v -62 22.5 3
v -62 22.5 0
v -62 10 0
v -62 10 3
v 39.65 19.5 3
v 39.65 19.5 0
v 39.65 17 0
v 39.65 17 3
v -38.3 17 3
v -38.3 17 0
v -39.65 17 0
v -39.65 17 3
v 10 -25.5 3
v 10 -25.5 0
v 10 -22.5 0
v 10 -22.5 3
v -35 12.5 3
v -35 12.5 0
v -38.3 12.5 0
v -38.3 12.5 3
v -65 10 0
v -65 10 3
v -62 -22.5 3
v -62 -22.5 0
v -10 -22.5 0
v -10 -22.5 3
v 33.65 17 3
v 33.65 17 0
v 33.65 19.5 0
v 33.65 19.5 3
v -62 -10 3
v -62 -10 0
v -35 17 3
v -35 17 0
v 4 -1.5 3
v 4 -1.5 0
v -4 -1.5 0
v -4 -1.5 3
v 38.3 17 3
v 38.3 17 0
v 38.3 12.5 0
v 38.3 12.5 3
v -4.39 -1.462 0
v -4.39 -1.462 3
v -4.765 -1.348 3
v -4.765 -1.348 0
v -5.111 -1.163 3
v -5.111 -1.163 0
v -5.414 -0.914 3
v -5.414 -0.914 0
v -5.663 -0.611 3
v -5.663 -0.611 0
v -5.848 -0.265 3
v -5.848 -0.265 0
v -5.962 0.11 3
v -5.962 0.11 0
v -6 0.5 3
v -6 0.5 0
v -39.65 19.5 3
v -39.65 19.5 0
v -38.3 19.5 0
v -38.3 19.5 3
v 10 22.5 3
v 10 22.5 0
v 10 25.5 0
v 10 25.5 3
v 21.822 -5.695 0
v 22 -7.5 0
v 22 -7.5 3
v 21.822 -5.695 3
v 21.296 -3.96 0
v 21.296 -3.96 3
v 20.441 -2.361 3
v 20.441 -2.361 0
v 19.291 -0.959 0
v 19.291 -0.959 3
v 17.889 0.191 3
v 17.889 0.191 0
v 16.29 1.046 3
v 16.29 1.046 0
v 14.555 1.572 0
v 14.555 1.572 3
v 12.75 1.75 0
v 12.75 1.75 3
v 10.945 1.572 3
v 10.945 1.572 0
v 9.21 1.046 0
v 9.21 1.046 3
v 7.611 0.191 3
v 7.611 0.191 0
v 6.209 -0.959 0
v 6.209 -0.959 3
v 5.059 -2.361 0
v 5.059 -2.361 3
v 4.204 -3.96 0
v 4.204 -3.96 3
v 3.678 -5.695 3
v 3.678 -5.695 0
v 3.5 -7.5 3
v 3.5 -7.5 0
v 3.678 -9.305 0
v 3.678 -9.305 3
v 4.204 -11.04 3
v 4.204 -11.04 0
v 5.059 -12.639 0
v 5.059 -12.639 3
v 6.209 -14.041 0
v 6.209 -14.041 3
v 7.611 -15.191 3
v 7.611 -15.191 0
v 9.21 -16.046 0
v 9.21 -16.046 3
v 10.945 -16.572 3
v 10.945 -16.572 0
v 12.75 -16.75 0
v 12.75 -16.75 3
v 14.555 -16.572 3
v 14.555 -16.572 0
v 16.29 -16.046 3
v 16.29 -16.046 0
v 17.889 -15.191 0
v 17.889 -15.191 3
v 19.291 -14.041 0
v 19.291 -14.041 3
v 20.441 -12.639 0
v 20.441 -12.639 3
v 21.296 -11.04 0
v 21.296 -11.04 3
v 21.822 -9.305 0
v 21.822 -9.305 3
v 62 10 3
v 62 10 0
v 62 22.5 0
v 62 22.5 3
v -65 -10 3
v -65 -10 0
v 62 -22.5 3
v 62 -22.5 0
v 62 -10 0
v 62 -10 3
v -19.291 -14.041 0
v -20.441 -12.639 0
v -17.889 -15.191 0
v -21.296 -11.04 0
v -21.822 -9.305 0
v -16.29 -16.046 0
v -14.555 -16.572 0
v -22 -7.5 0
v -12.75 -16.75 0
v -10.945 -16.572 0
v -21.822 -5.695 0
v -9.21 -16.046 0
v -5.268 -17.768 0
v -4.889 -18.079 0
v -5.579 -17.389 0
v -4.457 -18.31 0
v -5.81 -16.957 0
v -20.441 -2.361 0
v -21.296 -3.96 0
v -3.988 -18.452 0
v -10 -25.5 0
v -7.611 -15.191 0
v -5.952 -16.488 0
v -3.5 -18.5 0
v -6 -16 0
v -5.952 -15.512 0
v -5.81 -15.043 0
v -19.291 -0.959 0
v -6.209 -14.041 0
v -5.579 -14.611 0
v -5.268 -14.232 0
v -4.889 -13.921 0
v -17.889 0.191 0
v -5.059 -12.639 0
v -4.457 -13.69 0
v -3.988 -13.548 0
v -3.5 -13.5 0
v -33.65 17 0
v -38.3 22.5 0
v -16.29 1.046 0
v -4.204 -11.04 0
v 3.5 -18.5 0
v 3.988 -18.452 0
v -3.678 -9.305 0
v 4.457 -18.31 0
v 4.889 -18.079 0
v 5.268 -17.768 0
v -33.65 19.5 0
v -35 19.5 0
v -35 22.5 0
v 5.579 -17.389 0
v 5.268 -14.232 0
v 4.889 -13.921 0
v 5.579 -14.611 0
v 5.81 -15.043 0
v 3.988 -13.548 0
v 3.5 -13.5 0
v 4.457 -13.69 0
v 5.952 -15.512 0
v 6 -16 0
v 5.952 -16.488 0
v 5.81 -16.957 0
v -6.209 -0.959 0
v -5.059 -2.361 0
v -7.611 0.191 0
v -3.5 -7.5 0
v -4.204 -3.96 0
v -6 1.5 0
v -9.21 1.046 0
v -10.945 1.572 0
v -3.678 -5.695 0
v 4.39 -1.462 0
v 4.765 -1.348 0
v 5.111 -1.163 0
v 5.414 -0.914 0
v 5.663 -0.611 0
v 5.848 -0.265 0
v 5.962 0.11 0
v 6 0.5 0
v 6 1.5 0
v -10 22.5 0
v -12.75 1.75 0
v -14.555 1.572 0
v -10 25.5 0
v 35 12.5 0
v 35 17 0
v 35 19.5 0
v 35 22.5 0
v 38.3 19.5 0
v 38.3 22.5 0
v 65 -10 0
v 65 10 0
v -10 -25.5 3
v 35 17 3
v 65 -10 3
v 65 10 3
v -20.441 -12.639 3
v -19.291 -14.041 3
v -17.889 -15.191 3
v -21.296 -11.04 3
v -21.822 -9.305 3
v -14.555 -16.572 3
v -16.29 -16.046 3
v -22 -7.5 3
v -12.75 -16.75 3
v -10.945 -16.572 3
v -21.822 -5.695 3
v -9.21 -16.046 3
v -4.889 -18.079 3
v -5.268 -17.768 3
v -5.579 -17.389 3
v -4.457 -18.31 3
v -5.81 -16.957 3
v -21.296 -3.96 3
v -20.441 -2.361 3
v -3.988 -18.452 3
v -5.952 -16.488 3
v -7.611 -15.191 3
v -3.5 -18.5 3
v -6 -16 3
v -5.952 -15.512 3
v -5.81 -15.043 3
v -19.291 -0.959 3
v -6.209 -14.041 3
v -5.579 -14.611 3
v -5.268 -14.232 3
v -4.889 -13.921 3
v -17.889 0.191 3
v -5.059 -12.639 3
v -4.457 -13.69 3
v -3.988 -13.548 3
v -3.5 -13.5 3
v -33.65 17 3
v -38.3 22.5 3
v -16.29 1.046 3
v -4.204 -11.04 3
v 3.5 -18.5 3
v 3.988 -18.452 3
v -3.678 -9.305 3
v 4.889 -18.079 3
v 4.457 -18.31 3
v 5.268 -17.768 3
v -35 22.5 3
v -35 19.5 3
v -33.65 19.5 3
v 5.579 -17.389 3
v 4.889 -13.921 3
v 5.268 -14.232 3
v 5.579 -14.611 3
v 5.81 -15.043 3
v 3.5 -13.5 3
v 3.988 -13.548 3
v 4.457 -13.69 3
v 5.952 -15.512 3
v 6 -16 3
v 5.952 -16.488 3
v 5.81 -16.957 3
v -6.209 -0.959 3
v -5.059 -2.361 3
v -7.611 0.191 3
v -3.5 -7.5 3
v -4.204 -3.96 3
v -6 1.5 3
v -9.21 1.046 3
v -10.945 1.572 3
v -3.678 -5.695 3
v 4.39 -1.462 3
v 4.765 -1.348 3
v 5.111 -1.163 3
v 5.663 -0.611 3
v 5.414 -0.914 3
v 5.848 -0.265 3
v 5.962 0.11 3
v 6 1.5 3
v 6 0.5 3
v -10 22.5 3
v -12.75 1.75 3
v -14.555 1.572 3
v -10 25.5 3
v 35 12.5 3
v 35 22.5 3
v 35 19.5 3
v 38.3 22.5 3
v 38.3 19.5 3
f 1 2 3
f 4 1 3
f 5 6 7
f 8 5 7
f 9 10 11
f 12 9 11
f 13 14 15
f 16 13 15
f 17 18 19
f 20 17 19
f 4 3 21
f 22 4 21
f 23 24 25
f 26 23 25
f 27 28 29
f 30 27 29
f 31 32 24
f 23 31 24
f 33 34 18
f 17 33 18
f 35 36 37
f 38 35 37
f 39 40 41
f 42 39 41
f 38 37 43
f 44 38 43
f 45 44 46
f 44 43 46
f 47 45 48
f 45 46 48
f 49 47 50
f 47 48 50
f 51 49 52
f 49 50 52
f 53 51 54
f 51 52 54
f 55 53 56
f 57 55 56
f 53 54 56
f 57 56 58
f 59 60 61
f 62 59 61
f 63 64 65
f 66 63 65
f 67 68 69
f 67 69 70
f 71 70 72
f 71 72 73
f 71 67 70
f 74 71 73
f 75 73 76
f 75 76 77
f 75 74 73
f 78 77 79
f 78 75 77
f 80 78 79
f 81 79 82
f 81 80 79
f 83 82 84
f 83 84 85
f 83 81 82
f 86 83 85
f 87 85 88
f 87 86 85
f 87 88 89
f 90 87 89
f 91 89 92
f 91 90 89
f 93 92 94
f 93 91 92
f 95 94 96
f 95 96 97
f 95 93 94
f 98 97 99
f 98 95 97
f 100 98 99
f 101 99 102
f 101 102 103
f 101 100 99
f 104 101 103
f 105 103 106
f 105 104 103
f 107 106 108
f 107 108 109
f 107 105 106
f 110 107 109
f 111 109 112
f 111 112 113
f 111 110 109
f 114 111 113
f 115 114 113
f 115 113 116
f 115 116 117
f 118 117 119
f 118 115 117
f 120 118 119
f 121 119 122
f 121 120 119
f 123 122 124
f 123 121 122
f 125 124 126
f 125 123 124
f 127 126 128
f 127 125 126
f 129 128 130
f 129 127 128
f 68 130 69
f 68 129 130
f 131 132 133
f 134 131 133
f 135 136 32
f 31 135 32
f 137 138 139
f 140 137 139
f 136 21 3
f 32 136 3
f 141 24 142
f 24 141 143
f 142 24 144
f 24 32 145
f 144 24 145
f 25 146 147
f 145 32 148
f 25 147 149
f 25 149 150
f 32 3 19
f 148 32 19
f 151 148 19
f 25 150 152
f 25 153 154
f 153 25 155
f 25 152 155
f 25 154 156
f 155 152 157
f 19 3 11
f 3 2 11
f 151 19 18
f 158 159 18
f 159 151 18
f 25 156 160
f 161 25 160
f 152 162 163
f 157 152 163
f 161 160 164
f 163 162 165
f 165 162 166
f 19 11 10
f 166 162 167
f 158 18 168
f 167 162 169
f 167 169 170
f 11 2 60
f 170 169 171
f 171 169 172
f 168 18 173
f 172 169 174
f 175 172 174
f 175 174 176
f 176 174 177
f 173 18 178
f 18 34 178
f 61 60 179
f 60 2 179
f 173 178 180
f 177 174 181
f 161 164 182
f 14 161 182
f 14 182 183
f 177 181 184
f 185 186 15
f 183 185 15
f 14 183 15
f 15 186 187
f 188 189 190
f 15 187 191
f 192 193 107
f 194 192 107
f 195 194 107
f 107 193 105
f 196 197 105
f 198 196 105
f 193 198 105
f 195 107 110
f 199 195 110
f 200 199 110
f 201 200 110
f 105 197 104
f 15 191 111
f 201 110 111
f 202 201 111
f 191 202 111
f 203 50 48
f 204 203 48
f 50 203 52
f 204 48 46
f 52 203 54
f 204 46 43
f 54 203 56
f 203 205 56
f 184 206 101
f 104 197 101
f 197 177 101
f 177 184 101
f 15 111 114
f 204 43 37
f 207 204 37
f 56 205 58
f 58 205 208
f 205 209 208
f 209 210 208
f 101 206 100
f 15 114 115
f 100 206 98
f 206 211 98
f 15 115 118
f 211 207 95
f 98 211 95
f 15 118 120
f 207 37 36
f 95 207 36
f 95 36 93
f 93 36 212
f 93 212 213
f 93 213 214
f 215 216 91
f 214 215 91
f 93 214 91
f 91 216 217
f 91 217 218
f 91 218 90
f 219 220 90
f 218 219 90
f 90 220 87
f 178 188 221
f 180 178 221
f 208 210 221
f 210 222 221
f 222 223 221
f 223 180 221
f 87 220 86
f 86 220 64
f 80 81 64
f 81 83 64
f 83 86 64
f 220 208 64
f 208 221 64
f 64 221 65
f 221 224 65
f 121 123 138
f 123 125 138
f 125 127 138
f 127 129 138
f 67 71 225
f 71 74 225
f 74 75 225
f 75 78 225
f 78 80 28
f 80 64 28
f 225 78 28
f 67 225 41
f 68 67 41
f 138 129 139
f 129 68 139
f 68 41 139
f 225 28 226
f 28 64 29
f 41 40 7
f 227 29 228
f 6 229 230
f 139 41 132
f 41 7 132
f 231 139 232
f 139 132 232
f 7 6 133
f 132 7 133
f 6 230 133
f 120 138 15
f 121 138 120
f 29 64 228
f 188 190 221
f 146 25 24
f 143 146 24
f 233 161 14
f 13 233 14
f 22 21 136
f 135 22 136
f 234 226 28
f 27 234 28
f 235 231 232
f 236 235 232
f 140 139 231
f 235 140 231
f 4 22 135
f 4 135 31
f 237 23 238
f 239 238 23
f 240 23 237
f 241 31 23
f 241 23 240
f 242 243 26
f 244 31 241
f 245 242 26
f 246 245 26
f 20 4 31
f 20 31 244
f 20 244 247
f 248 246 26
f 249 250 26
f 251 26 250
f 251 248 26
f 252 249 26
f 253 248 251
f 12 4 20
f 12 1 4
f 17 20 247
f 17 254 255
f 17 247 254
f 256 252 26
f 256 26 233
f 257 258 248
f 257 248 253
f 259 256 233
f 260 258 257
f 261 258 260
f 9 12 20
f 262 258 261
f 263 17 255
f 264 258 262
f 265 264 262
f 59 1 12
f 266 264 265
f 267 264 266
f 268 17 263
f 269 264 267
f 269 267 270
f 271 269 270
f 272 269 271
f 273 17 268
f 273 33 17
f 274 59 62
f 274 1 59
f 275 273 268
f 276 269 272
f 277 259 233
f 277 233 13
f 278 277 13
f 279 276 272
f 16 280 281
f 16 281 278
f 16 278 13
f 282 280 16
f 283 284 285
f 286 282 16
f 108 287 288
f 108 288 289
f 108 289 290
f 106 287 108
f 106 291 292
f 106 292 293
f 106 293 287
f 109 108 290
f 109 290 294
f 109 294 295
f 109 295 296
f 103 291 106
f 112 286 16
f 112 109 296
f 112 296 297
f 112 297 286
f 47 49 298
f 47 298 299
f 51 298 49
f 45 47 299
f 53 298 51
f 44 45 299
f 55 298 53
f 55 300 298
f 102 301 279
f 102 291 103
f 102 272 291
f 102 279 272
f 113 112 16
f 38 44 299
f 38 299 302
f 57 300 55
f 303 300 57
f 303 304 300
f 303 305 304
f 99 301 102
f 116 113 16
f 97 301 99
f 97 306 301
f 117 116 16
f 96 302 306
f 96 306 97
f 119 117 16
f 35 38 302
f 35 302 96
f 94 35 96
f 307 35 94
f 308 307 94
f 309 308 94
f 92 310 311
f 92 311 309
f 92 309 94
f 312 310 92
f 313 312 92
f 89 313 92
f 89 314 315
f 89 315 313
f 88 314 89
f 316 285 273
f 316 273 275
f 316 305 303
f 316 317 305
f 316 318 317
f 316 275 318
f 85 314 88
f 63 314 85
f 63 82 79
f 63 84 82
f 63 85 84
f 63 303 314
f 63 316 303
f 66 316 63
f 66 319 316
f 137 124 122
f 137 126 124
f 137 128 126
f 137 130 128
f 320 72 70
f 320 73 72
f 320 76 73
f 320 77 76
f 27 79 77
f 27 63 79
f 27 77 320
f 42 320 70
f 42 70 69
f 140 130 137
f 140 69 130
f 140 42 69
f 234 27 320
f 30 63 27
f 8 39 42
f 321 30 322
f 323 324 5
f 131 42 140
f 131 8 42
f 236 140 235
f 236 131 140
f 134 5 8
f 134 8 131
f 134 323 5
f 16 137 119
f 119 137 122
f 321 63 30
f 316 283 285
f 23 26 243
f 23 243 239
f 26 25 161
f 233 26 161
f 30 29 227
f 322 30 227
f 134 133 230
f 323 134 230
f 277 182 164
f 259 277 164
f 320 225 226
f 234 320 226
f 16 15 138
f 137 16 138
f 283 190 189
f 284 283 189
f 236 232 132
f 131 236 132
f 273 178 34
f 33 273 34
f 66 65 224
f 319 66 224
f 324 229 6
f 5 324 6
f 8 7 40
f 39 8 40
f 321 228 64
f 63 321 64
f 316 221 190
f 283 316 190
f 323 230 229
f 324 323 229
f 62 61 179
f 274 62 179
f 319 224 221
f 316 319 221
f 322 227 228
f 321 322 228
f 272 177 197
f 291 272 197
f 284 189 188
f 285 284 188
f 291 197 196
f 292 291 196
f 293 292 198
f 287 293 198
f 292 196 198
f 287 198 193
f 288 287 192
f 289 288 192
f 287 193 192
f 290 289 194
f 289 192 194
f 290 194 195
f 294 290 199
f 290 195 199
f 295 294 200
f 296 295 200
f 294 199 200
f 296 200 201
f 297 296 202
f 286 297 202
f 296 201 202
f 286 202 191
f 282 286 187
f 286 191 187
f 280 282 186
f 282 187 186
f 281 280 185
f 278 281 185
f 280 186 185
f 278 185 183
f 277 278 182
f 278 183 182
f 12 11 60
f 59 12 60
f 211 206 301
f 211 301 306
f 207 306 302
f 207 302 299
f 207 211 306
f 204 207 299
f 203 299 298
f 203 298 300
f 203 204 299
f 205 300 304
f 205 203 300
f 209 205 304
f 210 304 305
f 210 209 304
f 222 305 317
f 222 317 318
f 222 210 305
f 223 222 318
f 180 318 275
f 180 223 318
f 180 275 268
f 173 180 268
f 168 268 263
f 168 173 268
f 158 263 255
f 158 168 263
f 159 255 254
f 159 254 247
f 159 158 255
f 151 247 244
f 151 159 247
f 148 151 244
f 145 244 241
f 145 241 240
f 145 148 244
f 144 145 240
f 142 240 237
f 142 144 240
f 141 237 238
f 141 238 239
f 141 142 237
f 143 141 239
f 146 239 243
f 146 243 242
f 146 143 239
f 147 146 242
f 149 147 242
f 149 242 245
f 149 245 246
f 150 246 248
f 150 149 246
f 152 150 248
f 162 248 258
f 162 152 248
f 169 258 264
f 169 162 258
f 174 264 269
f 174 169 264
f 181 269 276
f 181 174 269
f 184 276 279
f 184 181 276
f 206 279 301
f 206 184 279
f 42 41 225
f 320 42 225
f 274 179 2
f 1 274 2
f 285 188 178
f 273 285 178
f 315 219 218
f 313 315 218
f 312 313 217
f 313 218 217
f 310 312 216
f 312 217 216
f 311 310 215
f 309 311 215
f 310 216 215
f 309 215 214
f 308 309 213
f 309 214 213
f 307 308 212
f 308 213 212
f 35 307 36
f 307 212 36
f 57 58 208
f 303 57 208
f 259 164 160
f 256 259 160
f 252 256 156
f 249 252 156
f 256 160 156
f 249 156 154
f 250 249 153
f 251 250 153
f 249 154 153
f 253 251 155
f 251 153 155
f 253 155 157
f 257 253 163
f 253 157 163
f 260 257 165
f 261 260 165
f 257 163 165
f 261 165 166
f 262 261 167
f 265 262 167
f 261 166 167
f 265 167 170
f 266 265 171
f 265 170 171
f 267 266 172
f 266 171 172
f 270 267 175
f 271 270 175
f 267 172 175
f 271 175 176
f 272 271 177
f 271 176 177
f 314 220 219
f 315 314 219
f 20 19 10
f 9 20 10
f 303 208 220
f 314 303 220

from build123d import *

# Parameters (mm, degrees)
SKETCH1_R           = 9.25
BOSS_EXTRUDE1_DEPTH = 3


with BuildPart() as part:
    # Sketch1 → Boss-Extrude1 (new body)
    with BuildSketch(Plane.XY):
        Polygon((10, -22.5), (62, -22.5), (62, -10), (65, -10), (65, 10), (62, 10), (62, 22.5), (38.3, 22.5), (38.3, 19.5), (39.65, 19.5), (39.65, 17), (38.3, 17), (38.3, 12.5), (35, 12.5), (35, 17), (33.65, 17), (33.65, 19.5), (35, 19.5), (35, 22.5), (10, 22.5), (10, 25.5), (-10, 25.5), (-10, 22.5), (-35, 22.5), (-35, 19.5), (-33.65, 19.5), (-33.65, 17), (-35, 17), (-35, 12.5), (-38.3, 12.5), (-38.3, 17), (-39.65, 17), (-39.65, 19.5), (-38.3, 19.5), (-38.3, 22.5), (-62, 22.5), (-62, 10), (-65, 10), (-65, -10), (-62, -10), (-62, -22.5), (-10, -22.5), (-10, -25.5), (10, -25.5), align=None)
        with Locations((-12.75, -7.5)):
            Circle(SKETCH1_R, mode=Mode.SUBTRACT)
        with BuildLine():
            ThreePointArc((-3.5, -18.5), (-6, -16), (-3.5, -13.5))
            Line((-3.5, -13.5), (3.5, -13.5))
            ThreePointArc((3.5, -13.5), (6, -16), (3.5, -18.5))
            Line((3.5, -18.5), (-3.5, -18.5))
        make_face(mode=Mode.SUBTRACT)
        with Locations((12.75, -7.5)):
            Circle(SKETCH1_R, mode=Mode.SUBTRACT)
        with BuildLine():
            ThreePointArc((6, 0.5), (5.414213562, -0.914213562), (4, -1.5))
            Line((4, -1.5), (-4, -1.5))
            ThreePointArc((-4, -1.5), (-5.414213562, -0.914213562), (-6, 0.5))
            Line((-6, 0.5), (-6, 1.5))
            Line((-6, 1.5), (6, 1.5))
            Line((6, 1.5), (6, 0.5))
        make_face(mode=Mode.SUBTRACT)
    extrude(amount=BOSS_EXTRUDE1_DEPTH)


solid = part.part
